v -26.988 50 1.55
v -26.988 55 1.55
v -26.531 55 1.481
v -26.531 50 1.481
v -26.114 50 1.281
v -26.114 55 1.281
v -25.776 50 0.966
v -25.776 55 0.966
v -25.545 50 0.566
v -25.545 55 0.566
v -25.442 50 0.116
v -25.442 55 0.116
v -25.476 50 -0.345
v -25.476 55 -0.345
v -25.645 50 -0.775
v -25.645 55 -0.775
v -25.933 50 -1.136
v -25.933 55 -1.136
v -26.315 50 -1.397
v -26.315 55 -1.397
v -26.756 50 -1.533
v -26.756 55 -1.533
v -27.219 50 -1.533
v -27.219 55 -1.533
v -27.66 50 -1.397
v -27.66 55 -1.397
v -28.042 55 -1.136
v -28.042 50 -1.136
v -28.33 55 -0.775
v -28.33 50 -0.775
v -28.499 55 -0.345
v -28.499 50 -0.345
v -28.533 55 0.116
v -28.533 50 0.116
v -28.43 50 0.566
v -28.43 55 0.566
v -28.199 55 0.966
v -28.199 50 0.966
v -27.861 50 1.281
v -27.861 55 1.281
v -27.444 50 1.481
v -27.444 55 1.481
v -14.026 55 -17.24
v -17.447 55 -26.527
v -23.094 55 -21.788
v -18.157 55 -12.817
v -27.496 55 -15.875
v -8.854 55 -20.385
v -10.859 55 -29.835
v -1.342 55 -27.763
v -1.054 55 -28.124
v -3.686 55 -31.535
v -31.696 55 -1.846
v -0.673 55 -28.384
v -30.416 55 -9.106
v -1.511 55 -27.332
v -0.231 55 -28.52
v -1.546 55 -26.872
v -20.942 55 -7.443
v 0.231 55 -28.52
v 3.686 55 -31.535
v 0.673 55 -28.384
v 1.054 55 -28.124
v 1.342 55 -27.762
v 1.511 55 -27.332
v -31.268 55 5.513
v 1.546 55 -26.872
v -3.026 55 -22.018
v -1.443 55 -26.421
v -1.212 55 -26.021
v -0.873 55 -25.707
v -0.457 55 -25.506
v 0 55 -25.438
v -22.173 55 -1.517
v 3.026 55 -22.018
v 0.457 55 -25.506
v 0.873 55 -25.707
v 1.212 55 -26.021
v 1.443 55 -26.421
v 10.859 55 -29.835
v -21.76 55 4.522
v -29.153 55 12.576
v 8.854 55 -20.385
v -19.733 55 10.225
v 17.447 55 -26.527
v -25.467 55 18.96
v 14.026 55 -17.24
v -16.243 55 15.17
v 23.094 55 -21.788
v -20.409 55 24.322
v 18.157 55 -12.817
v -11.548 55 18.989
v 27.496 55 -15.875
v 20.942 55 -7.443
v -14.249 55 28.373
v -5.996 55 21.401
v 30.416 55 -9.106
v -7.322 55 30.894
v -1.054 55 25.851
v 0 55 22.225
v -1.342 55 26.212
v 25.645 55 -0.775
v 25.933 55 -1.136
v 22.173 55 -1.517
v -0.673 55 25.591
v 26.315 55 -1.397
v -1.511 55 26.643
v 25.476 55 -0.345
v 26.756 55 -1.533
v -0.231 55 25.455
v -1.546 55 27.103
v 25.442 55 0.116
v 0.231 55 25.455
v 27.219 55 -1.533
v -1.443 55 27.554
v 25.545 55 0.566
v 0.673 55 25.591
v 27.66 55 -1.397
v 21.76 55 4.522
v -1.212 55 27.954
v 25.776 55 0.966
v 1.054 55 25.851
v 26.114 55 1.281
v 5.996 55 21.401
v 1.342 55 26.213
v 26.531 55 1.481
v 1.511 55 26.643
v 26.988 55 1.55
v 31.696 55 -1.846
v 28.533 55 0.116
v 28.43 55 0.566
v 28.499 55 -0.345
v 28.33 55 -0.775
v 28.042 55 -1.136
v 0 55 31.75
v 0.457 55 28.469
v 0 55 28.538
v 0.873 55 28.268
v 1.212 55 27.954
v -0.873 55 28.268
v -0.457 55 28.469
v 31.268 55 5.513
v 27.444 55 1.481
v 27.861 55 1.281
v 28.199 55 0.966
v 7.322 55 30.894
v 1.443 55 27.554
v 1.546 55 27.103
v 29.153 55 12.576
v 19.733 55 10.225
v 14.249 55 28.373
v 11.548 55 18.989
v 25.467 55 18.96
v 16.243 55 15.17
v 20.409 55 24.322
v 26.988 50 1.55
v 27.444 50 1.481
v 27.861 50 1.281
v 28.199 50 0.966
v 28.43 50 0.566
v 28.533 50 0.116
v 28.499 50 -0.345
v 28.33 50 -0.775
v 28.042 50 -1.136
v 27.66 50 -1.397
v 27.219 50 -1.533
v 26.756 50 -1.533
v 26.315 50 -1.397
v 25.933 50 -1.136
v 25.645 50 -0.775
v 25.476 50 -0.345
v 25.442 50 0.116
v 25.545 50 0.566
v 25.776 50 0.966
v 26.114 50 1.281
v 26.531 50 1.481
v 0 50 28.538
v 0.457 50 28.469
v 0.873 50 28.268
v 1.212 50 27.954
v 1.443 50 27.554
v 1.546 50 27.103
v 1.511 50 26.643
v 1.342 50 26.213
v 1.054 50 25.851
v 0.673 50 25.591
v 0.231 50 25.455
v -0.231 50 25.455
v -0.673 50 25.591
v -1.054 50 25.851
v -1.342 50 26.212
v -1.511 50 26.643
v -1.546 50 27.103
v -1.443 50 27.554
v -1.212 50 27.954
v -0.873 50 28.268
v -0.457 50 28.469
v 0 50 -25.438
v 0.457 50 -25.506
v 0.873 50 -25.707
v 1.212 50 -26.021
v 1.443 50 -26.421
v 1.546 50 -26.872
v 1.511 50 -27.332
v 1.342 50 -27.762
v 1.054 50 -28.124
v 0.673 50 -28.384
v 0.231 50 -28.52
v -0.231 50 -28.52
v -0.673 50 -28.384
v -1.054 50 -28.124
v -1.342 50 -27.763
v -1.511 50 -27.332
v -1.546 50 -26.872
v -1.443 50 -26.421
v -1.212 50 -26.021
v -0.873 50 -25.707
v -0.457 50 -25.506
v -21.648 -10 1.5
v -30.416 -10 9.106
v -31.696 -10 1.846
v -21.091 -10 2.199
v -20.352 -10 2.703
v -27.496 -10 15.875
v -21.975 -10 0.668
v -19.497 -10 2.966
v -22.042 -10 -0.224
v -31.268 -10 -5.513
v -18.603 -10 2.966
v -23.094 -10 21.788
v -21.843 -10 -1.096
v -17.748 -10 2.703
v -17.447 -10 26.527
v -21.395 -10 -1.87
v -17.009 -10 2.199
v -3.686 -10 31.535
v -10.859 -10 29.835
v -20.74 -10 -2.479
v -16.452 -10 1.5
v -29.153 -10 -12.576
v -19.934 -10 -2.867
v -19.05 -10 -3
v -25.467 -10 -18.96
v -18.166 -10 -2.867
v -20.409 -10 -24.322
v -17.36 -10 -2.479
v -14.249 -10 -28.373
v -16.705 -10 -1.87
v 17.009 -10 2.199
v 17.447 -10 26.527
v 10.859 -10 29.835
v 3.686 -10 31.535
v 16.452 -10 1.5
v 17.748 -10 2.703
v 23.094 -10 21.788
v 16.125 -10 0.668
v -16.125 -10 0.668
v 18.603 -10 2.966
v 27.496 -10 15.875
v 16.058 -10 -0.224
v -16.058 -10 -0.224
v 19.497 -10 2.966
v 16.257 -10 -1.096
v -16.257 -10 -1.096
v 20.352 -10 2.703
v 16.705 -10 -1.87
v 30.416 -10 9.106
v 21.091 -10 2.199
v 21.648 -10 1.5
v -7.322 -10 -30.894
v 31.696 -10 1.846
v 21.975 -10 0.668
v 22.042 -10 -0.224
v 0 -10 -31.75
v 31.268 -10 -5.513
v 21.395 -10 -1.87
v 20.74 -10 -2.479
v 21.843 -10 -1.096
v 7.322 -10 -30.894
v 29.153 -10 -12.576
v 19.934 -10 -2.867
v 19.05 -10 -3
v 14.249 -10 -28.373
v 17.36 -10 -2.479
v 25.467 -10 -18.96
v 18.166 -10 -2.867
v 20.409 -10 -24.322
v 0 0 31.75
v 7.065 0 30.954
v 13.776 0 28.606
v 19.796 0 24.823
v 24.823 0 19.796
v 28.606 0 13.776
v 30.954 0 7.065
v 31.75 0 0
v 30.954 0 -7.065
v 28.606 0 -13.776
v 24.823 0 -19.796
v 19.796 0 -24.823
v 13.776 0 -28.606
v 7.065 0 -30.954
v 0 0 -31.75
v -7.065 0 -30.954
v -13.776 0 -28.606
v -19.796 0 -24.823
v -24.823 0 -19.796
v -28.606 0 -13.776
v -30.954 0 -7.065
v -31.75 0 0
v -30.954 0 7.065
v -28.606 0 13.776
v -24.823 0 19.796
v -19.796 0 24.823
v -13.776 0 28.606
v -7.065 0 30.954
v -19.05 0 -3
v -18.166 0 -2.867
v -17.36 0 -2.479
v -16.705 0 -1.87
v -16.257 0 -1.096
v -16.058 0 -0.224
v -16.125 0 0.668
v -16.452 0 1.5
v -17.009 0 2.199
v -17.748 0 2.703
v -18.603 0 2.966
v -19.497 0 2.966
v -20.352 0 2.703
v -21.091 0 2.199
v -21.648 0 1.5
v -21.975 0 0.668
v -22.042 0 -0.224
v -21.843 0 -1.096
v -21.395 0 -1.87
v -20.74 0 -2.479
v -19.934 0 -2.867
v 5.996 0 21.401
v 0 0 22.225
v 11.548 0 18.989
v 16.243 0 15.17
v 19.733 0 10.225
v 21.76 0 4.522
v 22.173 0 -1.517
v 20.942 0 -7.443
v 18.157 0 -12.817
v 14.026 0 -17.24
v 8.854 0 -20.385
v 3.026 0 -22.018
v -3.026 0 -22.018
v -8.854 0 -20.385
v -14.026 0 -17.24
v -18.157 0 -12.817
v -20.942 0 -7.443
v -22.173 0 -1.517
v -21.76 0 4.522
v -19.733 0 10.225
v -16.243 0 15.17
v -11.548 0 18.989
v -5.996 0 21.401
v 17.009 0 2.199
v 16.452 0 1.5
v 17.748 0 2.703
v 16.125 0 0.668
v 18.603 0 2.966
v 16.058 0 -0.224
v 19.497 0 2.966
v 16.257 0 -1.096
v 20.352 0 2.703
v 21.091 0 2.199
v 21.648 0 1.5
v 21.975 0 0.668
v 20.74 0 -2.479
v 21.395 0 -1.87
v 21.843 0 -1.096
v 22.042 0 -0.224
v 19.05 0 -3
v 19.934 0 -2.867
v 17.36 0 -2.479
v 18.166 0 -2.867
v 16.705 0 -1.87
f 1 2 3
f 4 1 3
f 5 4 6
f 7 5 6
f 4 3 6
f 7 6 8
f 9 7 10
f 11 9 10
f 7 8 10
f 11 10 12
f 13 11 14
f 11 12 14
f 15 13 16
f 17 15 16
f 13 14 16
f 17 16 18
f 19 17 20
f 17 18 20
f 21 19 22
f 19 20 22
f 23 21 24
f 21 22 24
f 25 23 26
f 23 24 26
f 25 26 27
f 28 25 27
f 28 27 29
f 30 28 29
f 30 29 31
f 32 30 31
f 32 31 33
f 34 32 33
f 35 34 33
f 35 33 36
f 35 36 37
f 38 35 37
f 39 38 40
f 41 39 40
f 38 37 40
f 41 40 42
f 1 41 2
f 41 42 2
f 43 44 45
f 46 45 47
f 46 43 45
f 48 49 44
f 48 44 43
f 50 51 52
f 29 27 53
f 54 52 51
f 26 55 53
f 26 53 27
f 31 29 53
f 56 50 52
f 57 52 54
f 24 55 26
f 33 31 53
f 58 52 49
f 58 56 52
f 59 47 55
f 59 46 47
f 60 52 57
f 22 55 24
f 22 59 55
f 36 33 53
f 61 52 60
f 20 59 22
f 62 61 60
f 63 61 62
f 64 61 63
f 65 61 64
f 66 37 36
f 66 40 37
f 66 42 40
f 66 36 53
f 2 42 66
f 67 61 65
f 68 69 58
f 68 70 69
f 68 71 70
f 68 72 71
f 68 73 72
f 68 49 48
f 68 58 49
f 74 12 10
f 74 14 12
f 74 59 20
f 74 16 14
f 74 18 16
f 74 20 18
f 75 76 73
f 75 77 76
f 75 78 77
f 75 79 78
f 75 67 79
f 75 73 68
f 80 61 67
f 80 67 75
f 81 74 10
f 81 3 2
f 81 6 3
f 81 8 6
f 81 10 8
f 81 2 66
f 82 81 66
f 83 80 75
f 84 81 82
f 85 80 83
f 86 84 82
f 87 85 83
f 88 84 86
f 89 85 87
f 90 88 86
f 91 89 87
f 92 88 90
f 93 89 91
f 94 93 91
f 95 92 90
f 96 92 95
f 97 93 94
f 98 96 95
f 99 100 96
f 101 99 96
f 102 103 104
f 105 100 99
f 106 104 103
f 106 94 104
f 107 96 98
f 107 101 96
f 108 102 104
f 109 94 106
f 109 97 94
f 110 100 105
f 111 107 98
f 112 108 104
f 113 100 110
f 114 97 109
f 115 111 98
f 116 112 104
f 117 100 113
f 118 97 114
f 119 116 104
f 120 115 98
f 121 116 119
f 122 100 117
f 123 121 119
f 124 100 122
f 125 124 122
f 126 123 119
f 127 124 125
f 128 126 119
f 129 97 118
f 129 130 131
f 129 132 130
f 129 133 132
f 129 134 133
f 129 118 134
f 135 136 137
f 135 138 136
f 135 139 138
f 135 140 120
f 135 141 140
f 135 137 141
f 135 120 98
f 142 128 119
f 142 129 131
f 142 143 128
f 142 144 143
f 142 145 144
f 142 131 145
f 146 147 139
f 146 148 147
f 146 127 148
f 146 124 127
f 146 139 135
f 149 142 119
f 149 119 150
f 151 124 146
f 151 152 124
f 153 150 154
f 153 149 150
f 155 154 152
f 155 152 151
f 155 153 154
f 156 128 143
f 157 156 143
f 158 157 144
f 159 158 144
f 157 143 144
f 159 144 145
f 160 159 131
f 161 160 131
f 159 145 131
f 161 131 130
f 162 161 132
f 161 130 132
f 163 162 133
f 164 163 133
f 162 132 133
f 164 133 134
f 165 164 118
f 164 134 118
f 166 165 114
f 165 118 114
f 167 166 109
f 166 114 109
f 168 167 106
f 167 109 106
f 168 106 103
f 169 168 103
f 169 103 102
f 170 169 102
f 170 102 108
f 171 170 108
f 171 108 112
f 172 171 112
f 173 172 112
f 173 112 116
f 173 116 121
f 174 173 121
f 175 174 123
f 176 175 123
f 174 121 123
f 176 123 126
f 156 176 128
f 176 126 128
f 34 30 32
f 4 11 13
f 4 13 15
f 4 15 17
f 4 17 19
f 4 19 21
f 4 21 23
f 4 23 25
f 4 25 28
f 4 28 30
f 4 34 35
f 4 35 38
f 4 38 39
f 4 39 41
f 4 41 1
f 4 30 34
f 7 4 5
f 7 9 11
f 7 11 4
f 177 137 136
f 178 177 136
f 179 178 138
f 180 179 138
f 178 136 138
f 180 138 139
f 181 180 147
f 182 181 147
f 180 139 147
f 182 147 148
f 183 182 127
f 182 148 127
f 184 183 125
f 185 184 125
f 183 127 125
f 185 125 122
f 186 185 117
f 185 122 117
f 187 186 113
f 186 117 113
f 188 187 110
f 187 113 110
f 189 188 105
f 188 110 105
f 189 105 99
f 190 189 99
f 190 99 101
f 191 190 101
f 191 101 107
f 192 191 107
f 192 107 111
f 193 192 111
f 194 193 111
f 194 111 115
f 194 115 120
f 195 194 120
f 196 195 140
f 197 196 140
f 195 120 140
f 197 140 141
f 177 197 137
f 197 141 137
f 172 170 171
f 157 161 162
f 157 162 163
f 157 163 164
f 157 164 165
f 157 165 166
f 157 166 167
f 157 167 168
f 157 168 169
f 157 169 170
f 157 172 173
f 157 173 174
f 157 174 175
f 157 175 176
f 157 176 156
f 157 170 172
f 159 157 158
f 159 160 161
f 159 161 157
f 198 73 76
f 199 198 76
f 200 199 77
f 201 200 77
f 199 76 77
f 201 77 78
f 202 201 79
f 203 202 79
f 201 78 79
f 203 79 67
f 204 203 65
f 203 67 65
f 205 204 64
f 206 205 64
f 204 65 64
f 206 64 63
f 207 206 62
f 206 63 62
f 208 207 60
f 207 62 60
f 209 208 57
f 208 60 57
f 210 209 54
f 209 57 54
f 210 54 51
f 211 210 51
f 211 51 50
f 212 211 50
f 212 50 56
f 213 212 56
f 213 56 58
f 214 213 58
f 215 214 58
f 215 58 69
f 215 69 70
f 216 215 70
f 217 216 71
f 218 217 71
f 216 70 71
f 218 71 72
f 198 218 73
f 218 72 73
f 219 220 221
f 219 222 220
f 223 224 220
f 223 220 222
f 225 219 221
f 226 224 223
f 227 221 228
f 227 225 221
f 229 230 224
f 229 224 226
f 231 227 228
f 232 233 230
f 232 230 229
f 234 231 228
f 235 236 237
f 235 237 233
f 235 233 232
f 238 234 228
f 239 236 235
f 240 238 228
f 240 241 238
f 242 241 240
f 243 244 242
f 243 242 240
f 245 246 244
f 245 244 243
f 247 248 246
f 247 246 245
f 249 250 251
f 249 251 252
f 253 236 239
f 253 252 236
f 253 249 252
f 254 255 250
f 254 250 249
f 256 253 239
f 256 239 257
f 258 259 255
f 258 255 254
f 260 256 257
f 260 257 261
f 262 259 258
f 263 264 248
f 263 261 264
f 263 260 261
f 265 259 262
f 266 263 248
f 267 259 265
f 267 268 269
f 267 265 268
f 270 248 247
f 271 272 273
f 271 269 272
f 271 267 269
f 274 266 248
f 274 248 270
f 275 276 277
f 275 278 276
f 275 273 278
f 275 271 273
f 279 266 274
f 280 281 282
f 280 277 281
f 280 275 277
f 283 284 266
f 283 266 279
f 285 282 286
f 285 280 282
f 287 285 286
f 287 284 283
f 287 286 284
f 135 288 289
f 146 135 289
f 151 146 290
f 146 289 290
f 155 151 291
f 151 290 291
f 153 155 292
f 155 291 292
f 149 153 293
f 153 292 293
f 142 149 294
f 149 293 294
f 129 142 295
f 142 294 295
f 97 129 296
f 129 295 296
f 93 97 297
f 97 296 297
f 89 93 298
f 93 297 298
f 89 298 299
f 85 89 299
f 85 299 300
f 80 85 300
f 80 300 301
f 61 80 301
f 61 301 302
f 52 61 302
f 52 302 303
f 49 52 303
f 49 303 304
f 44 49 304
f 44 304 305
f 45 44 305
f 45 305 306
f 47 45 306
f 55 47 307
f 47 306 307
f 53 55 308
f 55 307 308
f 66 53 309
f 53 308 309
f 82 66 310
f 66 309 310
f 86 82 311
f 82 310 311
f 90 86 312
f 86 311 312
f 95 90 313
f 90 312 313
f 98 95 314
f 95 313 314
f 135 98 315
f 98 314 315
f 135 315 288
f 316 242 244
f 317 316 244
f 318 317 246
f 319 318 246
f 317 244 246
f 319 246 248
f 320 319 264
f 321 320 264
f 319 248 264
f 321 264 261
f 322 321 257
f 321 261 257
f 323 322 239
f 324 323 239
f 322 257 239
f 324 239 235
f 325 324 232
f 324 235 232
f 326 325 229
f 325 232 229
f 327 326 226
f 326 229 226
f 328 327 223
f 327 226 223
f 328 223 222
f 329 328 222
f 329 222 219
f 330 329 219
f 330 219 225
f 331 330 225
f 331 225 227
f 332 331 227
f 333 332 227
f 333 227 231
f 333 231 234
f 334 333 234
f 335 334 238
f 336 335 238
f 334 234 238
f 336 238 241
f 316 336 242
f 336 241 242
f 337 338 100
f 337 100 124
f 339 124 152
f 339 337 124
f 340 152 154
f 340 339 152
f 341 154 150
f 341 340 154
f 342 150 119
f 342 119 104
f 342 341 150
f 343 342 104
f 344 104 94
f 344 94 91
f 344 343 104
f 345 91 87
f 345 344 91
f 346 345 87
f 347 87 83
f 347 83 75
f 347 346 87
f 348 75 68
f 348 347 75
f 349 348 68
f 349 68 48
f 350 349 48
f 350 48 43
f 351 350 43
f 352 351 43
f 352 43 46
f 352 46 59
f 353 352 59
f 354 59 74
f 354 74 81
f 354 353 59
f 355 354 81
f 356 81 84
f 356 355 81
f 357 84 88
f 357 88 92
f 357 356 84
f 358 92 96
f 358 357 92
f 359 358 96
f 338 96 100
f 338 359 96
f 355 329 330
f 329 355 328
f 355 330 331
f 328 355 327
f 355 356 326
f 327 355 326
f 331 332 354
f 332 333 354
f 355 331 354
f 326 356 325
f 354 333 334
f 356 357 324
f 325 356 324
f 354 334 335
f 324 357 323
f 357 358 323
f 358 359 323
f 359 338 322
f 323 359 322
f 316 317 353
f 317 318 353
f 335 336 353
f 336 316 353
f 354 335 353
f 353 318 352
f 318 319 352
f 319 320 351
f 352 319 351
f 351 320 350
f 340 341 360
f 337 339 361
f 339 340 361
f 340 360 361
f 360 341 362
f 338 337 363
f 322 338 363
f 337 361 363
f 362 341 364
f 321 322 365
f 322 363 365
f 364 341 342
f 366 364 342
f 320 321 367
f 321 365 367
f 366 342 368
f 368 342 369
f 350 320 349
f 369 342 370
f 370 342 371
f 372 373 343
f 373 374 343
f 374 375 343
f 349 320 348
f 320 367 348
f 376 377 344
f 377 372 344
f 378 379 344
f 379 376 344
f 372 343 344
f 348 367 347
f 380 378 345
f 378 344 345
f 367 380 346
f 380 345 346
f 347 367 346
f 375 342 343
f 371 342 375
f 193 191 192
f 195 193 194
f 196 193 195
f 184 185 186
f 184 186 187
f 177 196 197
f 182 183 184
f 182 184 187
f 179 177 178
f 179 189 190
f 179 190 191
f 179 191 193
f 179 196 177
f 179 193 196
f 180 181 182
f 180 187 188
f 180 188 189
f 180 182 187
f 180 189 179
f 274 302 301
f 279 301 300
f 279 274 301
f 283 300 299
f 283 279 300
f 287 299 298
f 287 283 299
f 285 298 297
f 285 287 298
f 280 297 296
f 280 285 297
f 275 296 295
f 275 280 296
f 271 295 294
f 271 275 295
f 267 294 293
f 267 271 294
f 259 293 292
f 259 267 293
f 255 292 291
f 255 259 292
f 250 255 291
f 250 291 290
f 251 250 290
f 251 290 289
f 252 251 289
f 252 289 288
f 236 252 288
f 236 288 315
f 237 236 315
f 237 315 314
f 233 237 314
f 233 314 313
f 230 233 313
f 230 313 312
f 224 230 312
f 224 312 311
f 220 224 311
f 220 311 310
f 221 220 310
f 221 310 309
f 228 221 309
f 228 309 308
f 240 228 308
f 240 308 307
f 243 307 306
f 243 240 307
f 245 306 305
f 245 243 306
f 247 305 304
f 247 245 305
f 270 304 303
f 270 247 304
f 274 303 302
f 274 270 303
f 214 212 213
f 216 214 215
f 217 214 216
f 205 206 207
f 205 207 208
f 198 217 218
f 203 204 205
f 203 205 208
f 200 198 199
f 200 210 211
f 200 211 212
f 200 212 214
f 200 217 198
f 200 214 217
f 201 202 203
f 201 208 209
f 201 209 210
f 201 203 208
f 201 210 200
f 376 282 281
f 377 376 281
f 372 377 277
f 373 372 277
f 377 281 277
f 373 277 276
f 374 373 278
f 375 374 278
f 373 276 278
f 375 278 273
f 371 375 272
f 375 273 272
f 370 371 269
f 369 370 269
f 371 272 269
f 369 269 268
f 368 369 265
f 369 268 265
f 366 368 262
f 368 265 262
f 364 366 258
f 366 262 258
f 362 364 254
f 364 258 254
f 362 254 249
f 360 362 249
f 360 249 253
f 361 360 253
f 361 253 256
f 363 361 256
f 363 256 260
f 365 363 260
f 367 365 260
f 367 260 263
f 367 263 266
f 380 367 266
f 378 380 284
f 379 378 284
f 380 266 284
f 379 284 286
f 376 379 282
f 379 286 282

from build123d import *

# Parameters (mm, degrees)
SKETCH1_R           = 31.75
SKETCH1_R_2         = 22.225
BOSS_EXTRUDE1_DEPTH = 55
BOSS_EXTRUDE2_START = 10
SKETCH2_R           = 31.75
BOSS_EXTRUDE2_DEPTH = 10
SKETCH3_R           = 1.55
CUT_EXTRUDE1_DEPTH  = 5
SKETCH7_R           = 3
CUT_EXTRUDE2_DEPTH  = 10


with BuildPart() as part:
    # Sketch1 → Boss-Extrude1 (new body)
    with BuildSketch(Plane(origin=(0, 0, 0), x_dir=(1, 0, 0), z_dir=(0, 1, 0))):
        with Locations(Location((0, 0, 0), (0, 0, 270))):
            Circle(SKETCH1_R)
        with Locations(Location((0, 0, 0), (0, 0, 270))):
            Circle(SKETCH1_R_2, mode=Mode.SUBTRACT)
    extrude(amount=BOSS_EXTRUDE1_DEPTH)

    # Sketch2 → Boss-Extrude2 (add)
    with BuildSketch(Plane.XZ.offset(BOSS_EXTRUDE2_START)):
        with Locations(Location((0, 0, 0), (0, 0, 270))):
            Circle(SKETCH2_R)
    extrude(amount=-BOSS_EXTRUDE2_DEPTH)

    # Sketch3 → Cut-Extrude1 (cut)
    with BuildSketch(Plane(origin=(0, 55, 0), x_dir=(1, 0, 0), z_dir=(0, 1, 0))):
        with Locations(Location((0, 26.9875, 0), (0, 0, 270))):
            Circle(SKETCH3_R)
        with Locations(Location((26.9875, 0, 0), (0, 0, 270))):
            Circle(SKETCH3_R)
        with Locations(Location((0, -26.9875, 0), (0, 0, 270))):
            Circle(SKETCH3_R)
        with Locations(Location((-26.9875, 0, 0), (0, 0, 270))):
            Circle(SKETCH3_R)
    extrude(amount=-CUT_EXTRUDE1_DEPTH, mode=Mode.SUBTRACT)

    # Sketch7 → Cut-Extrude2 (cut)
    with BuildSketch(Plane(origin=(0, -10, 0), x_dir=(-1, 0, 0), z_dir=(0, -1, 0))):
        with Locations(Location((19.05, 0, 0), (0, 0, 90))):
            Circle(SKETCH7_R)
        with Locations(Location((-19.05, 0, 0), (0, 0, 90))):
            Circle(SKETCH7_R)
    extrude(amount=-CUT_EXTRUDE2_DEPTH, mode=Mode.SUBTRACT)


solid = part.part
